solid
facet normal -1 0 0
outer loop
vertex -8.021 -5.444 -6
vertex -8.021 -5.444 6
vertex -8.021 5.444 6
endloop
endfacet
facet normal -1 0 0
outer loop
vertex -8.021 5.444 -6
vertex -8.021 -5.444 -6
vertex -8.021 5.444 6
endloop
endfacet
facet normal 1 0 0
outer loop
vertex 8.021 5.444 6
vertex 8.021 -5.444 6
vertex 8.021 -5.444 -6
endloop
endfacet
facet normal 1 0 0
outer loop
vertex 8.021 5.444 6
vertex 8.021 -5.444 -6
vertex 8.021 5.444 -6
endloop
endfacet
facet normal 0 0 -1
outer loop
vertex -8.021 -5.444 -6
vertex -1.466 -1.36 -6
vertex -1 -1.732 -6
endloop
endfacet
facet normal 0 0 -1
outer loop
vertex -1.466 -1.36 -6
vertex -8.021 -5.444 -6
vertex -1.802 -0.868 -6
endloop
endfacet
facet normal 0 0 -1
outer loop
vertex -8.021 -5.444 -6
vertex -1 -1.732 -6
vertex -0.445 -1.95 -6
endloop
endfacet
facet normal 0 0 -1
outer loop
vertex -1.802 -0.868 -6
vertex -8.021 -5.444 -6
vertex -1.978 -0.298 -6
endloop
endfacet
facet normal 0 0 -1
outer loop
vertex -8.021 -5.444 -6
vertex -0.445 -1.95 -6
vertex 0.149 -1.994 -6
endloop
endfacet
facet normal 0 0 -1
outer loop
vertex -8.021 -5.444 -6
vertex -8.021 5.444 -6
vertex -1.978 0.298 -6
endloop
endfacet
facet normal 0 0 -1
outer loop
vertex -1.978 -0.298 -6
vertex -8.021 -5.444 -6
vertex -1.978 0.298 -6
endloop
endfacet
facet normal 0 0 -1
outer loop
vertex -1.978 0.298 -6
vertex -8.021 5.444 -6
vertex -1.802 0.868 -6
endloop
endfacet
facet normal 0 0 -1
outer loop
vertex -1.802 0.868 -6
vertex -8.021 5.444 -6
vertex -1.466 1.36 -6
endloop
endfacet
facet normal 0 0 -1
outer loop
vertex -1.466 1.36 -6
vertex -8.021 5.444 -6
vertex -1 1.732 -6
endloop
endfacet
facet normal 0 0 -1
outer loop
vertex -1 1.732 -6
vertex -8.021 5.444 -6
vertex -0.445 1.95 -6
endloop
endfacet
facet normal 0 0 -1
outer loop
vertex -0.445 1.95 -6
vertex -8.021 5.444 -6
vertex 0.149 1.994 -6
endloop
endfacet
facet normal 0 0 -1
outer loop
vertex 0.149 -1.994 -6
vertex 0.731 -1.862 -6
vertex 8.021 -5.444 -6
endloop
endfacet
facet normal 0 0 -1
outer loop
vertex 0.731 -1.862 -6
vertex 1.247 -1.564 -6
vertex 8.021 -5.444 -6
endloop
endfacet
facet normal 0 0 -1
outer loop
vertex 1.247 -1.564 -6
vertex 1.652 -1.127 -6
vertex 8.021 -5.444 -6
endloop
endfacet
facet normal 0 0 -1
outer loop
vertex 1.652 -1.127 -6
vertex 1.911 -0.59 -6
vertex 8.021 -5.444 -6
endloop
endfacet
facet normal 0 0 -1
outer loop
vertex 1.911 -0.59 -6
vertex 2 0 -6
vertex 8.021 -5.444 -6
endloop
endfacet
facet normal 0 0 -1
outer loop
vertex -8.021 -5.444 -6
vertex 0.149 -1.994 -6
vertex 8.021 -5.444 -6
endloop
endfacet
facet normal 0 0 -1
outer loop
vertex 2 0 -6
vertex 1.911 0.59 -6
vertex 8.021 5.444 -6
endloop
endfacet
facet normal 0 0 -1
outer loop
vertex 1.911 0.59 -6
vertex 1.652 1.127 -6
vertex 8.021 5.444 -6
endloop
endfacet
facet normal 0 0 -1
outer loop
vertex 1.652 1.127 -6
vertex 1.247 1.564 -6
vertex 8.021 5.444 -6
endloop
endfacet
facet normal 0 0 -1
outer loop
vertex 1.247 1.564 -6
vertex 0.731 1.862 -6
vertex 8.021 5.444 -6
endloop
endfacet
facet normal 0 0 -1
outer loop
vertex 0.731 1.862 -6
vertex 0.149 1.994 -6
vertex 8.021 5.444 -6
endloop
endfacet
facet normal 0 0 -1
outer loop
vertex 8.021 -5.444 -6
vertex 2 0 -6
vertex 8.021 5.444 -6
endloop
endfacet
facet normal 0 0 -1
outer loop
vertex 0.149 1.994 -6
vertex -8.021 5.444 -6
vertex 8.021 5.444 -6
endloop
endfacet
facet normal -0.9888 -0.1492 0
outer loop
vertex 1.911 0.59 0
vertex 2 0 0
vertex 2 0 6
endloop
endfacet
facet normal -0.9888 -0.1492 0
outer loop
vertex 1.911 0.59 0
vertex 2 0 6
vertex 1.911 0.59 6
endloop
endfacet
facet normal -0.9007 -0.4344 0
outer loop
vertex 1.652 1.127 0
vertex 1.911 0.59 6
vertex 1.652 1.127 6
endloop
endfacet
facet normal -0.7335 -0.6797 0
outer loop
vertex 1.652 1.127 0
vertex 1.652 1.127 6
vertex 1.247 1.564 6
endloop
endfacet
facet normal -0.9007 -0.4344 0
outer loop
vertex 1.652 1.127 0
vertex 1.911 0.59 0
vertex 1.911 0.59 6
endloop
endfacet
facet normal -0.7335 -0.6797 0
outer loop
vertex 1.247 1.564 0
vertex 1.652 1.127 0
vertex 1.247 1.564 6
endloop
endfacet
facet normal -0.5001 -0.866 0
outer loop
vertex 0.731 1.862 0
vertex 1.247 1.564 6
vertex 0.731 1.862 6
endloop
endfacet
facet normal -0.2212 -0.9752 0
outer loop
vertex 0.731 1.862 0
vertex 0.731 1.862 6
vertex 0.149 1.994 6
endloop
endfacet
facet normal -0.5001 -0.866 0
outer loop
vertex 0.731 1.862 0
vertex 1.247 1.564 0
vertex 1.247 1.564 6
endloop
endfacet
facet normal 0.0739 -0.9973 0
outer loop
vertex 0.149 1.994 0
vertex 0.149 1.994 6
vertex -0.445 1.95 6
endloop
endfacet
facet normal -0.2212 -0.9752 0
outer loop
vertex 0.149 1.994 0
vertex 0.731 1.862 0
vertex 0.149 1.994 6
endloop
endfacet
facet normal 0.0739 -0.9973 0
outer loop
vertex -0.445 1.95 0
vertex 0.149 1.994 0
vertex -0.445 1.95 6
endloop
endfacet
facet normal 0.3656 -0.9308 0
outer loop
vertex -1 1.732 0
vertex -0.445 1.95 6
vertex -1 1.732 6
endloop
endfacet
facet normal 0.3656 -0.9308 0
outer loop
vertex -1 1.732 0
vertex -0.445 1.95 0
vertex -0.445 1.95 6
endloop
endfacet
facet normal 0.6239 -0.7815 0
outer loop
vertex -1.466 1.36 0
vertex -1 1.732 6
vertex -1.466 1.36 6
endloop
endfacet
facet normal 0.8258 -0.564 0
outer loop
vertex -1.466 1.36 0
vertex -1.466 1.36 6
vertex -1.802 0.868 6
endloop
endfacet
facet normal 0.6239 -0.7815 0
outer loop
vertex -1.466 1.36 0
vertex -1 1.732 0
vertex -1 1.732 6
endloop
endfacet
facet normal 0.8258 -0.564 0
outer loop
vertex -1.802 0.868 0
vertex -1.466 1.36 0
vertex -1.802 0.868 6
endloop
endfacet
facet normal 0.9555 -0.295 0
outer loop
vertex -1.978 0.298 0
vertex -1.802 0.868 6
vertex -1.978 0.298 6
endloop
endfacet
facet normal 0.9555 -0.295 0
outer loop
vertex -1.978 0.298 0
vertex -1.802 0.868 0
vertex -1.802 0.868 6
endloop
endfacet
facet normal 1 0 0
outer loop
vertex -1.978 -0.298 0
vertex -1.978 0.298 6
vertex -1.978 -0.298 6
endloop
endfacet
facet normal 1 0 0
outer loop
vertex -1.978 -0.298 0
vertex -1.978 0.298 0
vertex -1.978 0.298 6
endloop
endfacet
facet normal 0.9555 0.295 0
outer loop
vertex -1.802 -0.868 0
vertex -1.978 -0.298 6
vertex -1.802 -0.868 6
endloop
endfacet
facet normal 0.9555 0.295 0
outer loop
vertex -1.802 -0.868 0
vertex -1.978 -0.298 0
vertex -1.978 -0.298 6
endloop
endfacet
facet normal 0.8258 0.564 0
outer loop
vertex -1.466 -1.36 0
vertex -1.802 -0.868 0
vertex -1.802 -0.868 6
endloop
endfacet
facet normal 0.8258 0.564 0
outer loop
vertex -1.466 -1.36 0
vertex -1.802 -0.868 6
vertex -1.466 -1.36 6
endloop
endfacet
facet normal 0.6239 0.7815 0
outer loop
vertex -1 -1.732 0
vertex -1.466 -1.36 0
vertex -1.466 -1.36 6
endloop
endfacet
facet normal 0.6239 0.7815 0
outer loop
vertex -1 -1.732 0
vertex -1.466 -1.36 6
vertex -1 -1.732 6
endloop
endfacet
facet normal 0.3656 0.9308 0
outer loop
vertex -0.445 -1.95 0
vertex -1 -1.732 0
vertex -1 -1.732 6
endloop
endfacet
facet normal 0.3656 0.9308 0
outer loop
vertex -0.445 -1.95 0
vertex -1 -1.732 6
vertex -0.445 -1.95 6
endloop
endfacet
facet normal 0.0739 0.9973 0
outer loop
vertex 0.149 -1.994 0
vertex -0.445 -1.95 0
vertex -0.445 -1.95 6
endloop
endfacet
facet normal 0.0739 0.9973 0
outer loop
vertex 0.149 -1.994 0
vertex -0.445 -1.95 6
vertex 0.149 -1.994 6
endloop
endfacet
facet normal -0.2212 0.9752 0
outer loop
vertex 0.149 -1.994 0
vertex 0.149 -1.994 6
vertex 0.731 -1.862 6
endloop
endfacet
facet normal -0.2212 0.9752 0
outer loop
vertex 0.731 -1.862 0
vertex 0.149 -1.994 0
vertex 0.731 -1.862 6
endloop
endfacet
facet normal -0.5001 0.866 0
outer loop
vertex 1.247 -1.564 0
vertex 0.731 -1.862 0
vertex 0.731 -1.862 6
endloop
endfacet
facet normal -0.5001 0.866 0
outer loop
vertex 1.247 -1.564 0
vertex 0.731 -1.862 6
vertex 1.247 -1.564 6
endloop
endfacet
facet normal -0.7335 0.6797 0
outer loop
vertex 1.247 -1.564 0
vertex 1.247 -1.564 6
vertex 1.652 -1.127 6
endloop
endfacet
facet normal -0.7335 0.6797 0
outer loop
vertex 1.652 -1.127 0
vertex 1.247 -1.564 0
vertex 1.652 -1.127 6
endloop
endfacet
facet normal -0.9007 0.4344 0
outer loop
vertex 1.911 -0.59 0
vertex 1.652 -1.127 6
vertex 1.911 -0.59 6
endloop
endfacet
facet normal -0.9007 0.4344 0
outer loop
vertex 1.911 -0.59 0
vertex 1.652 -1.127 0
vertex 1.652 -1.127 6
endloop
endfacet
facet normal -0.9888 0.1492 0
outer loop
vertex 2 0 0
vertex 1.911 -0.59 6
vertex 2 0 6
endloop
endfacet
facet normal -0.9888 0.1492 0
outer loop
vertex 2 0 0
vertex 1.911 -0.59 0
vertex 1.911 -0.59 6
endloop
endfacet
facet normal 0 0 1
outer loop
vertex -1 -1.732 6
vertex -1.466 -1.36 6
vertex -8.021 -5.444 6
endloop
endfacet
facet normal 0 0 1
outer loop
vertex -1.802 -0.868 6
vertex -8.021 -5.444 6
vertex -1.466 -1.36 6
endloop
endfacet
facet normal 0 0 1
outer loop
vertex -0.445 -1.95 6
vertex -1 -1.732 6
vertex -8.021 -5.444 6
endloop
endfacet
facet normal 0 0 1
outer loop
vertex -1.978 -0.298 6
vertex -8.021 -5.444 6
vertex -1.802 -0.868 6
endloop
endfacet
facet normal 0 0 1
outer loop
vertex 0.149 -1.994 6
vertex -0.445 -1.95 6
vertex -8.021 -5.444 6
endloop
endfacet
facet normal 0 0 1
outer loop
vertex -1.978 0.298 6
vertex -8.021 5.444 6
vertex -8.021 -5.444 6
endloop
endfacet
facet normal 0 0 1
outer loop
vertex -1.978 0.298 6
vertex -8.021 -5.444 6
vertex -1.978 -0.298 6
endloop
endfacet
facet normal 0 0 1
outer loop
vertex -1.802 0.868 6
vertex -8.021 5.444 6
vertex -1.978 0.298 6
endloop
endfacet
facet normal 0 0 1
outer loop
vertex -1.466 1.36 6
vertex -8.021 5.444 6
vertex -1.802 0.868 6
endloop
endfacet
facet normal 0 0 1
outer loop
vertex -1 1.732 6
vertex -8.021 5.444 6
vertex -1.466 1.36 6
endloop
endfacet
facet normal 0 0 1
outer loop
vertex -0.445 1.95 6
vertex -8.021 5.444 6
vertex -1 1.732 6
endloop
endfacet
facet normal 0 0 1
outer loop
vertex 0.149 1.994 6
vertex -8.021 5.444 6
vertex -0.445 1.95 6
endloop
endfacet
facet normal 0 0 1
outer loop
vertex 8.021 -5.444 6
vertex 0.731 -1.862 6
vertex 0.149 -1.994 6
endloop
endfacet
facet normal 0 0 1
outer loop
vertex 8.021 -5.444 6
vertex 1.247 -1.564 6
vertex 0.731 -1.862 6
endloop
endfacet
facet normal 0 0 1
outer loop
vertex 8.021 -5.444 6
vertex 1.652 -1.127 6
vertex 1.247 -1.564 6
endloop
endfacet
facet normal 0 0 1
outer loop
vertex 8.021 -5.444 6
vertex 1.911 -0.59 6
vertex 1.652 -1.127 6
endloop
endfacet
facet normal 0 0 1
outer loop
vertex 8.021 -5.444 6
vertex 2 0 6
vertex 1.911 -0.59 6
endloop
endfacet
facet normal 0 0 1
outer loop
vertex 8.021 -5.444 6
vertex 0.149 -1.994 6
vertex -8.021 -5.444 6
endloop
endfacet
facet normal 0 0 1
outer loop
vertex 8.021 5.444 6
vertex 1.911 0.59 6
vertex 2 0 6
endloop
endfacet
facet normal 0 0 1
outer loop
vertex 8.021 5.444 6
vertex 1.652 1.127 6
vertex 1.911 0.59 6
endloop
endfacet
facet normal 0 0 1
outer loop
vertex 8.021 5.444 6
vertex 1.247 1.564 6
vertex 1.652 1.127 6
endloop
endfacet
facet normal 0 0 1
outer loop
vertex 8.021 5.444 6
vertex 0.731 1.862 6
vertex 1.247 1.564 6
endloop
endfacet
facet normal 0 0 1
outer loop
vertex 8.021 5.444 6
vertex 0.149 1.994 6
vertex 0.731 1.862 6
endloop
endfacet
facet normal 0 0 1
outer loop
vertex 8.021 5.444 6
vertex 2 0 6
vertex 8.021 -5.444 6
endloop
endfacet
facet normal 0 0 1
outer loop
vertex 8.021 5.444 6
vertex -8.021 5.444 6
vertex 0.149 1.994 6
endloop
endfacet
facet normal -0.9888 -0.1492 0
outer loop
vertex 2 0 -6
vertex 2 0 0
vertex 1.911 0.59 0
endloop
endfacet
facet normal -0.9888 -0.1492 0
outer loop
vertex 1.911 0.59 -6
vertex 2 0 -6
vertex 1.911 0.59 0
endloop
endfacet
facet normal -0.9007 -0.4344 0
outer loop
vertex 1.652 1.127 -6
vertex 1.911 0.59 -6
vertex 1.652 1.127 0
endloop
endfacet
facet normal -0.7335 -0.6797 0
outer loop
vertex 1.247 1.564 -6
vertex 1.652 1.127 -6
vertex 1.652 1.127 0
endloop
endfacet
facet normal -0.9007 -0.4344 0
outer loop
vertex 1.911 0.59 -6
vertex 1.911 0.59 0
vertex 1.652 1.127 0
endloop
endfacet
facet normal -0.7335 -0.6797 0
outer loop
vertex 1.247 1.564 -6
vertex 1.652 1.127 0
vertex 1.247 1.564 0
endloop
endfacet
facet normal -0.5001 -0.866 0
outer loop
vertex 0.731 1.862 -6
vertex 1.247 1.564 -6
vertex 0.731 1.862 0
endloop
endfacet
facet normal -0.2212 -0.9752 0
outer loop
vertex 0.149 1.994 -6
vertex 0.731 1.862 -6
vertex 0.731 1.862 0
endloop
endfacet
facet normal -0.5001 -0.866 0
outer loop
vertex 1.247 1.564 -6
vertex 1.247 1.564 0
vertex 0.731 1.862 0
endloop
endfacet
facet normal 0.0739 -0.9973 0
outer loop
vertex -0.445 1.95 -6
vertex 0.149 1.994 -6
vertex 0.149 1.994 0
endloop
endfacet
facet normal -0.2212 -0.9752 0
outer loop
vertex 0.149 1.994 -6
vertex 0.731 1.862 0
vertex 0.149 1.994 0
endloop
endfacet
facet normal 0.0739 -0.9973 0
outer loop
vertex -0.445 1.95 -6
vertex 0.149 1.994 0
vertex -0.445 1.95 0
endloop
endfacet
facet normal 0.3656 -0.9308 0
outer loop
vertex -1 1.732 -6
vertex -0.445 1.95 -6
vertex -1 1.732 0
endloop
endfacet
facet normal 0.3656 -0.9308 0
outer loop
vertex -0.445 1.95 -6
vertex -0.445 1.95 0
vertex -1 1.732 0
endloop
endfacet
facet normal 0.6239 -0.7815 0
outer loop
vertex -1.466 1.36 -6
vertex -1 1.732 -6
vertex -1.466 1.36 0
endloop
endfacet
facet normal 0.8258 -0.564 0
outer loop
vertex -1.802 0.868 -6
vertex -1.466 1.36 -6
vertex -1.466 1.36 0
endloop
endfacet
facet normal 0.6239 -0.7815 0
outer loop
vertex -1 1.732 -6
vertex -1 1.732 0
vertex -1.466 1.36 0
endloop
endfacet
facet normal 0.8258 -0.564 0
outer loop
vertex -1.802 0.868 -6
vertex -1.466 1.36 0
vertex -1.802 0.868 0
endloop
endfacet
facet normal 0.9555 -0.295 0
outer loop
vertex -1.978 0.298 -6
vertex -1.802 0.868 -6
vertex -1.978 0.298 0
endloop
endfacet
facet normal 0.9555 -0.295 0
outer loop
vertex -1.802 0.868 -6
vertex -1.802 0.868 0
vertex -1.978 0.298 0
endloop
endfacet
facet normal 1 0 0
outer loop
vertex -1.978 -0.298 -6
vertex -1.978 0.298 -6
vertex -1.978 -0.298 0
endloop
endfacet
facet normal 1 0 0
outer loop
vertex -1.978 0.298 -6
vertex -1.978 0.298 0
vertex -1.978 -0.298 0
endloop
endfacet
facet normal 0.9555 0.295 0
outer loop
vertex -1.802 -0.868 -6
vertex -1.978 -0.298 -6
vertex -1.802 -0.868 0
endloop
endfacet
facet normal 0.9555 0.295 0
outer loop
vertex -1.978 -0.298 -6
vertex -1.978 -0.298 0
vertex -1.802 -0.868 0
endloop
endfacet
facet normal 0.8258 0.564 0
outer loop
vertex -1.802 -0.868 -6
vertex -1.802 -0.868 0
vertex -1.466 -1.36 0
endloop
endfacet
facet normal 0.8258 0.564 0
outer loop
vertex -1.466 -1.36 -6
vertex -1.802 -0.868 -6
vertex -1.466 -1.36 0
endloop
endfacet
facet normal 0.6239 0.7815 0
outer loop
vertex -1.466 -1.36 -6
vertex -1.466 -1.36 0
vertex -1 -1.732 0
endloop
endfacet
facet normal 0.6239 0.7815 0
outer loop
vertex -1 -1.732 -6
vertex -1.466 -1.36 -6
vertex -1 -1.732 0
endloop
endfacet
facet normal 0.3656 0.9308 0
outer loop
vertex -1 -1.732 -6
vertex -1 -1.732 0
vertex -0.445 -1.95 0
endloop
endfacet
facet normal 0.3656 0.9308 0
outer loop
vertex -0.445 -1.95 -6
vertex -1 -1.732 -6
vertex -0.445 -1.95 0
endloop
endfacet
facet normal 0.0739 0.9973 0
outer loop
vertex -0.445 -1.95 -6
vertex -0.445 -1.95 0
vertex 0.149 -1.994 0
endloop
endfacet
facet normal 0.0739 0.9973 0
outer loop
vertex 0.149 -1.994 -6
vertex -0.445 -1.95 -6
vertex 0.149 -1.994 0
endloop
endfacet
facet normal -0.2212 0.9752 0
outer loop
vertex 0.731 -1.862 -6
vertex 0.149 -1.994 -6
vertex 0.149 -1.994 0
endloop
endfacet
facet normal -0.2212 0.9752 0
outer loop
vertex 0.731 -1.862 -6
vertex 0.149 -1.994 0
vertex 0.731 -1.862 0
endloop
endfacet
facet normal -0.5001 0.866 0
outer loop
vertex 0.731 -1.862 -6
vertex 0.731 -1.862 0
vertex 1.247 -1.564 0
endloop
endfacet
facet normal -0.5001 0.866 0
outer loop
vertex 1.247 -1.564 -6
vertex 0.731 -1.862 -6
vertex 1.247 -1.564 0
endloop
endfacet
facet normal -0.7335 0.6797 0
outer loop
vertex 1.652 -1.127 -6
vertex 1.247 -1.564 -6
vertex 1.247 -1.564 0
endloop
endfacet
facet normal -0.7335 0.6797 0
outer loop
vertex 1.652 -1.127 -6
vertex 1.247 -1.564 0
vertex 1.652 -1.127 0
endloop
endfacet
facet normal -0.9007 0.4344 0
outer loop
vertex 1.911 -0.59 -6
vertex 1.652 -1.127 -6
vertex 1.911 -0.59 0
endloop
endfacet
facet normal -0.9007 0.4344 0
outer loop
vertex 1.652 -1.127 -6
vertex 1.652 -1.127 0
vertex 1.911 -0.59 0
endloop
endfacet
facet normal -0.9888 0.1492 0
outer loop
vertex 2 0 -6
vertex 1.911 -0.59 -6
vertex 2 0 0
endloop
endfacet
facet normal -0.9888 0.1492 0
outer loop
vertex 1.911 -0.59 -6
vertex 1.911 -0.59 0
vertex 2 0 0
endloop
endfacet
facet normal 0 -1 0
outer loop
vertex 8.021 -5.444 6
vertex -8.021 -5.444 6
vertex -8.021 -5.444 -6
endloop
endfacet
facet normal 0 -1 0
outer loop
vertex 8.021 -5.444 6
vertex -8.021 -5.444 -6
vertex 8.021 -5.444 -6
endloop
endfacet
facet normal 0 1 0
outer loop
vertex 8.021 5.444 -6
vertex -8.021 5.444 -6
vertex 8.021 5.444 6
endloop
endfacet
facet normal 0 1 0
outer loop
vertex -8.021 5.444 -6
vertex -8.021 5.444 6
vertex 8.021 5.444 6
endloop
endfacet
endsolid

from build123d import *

# Parameters (mm, degrees)
F0_R          = 19.05
F0_R_2        = 7.9375
F1_DEPTH      = 25.4
F3_W          = 16.0429216921
F3_H          = 10.8887040988
F3_R          = 2
F4_DEPTH      = 6
F4_DEPTH_BACK = 6


# Not quite as in the source:
# - the program builds the solid bodies; features that only make, move or delete a surface that nothing else refers to are left out


with BuildPart() as f1:
    # F0 (on Top) → F1 (new body)
    with BuildSketch(Plane.XY):
        Circle(F0_R)
        Circle(F0_R_2, mode=Mode.SUBTRACT)
    extrude(amount=F1_DEPTH)


with BuildPart() as f4:
    # F3 (on Top) → F4 (new body, two sides)
    with BuildSketch(Plane.XY) as f4_sk:
        Rectangle(F3_W, F3_H)
        Circle(F3_R, mode=Mode.SUBTRACT)
    extrude(amount=F4_DEPTH)
    extrude(f4_sk.sketch, amount=-F4_DEPTH_BACK)


solid = f4.part
